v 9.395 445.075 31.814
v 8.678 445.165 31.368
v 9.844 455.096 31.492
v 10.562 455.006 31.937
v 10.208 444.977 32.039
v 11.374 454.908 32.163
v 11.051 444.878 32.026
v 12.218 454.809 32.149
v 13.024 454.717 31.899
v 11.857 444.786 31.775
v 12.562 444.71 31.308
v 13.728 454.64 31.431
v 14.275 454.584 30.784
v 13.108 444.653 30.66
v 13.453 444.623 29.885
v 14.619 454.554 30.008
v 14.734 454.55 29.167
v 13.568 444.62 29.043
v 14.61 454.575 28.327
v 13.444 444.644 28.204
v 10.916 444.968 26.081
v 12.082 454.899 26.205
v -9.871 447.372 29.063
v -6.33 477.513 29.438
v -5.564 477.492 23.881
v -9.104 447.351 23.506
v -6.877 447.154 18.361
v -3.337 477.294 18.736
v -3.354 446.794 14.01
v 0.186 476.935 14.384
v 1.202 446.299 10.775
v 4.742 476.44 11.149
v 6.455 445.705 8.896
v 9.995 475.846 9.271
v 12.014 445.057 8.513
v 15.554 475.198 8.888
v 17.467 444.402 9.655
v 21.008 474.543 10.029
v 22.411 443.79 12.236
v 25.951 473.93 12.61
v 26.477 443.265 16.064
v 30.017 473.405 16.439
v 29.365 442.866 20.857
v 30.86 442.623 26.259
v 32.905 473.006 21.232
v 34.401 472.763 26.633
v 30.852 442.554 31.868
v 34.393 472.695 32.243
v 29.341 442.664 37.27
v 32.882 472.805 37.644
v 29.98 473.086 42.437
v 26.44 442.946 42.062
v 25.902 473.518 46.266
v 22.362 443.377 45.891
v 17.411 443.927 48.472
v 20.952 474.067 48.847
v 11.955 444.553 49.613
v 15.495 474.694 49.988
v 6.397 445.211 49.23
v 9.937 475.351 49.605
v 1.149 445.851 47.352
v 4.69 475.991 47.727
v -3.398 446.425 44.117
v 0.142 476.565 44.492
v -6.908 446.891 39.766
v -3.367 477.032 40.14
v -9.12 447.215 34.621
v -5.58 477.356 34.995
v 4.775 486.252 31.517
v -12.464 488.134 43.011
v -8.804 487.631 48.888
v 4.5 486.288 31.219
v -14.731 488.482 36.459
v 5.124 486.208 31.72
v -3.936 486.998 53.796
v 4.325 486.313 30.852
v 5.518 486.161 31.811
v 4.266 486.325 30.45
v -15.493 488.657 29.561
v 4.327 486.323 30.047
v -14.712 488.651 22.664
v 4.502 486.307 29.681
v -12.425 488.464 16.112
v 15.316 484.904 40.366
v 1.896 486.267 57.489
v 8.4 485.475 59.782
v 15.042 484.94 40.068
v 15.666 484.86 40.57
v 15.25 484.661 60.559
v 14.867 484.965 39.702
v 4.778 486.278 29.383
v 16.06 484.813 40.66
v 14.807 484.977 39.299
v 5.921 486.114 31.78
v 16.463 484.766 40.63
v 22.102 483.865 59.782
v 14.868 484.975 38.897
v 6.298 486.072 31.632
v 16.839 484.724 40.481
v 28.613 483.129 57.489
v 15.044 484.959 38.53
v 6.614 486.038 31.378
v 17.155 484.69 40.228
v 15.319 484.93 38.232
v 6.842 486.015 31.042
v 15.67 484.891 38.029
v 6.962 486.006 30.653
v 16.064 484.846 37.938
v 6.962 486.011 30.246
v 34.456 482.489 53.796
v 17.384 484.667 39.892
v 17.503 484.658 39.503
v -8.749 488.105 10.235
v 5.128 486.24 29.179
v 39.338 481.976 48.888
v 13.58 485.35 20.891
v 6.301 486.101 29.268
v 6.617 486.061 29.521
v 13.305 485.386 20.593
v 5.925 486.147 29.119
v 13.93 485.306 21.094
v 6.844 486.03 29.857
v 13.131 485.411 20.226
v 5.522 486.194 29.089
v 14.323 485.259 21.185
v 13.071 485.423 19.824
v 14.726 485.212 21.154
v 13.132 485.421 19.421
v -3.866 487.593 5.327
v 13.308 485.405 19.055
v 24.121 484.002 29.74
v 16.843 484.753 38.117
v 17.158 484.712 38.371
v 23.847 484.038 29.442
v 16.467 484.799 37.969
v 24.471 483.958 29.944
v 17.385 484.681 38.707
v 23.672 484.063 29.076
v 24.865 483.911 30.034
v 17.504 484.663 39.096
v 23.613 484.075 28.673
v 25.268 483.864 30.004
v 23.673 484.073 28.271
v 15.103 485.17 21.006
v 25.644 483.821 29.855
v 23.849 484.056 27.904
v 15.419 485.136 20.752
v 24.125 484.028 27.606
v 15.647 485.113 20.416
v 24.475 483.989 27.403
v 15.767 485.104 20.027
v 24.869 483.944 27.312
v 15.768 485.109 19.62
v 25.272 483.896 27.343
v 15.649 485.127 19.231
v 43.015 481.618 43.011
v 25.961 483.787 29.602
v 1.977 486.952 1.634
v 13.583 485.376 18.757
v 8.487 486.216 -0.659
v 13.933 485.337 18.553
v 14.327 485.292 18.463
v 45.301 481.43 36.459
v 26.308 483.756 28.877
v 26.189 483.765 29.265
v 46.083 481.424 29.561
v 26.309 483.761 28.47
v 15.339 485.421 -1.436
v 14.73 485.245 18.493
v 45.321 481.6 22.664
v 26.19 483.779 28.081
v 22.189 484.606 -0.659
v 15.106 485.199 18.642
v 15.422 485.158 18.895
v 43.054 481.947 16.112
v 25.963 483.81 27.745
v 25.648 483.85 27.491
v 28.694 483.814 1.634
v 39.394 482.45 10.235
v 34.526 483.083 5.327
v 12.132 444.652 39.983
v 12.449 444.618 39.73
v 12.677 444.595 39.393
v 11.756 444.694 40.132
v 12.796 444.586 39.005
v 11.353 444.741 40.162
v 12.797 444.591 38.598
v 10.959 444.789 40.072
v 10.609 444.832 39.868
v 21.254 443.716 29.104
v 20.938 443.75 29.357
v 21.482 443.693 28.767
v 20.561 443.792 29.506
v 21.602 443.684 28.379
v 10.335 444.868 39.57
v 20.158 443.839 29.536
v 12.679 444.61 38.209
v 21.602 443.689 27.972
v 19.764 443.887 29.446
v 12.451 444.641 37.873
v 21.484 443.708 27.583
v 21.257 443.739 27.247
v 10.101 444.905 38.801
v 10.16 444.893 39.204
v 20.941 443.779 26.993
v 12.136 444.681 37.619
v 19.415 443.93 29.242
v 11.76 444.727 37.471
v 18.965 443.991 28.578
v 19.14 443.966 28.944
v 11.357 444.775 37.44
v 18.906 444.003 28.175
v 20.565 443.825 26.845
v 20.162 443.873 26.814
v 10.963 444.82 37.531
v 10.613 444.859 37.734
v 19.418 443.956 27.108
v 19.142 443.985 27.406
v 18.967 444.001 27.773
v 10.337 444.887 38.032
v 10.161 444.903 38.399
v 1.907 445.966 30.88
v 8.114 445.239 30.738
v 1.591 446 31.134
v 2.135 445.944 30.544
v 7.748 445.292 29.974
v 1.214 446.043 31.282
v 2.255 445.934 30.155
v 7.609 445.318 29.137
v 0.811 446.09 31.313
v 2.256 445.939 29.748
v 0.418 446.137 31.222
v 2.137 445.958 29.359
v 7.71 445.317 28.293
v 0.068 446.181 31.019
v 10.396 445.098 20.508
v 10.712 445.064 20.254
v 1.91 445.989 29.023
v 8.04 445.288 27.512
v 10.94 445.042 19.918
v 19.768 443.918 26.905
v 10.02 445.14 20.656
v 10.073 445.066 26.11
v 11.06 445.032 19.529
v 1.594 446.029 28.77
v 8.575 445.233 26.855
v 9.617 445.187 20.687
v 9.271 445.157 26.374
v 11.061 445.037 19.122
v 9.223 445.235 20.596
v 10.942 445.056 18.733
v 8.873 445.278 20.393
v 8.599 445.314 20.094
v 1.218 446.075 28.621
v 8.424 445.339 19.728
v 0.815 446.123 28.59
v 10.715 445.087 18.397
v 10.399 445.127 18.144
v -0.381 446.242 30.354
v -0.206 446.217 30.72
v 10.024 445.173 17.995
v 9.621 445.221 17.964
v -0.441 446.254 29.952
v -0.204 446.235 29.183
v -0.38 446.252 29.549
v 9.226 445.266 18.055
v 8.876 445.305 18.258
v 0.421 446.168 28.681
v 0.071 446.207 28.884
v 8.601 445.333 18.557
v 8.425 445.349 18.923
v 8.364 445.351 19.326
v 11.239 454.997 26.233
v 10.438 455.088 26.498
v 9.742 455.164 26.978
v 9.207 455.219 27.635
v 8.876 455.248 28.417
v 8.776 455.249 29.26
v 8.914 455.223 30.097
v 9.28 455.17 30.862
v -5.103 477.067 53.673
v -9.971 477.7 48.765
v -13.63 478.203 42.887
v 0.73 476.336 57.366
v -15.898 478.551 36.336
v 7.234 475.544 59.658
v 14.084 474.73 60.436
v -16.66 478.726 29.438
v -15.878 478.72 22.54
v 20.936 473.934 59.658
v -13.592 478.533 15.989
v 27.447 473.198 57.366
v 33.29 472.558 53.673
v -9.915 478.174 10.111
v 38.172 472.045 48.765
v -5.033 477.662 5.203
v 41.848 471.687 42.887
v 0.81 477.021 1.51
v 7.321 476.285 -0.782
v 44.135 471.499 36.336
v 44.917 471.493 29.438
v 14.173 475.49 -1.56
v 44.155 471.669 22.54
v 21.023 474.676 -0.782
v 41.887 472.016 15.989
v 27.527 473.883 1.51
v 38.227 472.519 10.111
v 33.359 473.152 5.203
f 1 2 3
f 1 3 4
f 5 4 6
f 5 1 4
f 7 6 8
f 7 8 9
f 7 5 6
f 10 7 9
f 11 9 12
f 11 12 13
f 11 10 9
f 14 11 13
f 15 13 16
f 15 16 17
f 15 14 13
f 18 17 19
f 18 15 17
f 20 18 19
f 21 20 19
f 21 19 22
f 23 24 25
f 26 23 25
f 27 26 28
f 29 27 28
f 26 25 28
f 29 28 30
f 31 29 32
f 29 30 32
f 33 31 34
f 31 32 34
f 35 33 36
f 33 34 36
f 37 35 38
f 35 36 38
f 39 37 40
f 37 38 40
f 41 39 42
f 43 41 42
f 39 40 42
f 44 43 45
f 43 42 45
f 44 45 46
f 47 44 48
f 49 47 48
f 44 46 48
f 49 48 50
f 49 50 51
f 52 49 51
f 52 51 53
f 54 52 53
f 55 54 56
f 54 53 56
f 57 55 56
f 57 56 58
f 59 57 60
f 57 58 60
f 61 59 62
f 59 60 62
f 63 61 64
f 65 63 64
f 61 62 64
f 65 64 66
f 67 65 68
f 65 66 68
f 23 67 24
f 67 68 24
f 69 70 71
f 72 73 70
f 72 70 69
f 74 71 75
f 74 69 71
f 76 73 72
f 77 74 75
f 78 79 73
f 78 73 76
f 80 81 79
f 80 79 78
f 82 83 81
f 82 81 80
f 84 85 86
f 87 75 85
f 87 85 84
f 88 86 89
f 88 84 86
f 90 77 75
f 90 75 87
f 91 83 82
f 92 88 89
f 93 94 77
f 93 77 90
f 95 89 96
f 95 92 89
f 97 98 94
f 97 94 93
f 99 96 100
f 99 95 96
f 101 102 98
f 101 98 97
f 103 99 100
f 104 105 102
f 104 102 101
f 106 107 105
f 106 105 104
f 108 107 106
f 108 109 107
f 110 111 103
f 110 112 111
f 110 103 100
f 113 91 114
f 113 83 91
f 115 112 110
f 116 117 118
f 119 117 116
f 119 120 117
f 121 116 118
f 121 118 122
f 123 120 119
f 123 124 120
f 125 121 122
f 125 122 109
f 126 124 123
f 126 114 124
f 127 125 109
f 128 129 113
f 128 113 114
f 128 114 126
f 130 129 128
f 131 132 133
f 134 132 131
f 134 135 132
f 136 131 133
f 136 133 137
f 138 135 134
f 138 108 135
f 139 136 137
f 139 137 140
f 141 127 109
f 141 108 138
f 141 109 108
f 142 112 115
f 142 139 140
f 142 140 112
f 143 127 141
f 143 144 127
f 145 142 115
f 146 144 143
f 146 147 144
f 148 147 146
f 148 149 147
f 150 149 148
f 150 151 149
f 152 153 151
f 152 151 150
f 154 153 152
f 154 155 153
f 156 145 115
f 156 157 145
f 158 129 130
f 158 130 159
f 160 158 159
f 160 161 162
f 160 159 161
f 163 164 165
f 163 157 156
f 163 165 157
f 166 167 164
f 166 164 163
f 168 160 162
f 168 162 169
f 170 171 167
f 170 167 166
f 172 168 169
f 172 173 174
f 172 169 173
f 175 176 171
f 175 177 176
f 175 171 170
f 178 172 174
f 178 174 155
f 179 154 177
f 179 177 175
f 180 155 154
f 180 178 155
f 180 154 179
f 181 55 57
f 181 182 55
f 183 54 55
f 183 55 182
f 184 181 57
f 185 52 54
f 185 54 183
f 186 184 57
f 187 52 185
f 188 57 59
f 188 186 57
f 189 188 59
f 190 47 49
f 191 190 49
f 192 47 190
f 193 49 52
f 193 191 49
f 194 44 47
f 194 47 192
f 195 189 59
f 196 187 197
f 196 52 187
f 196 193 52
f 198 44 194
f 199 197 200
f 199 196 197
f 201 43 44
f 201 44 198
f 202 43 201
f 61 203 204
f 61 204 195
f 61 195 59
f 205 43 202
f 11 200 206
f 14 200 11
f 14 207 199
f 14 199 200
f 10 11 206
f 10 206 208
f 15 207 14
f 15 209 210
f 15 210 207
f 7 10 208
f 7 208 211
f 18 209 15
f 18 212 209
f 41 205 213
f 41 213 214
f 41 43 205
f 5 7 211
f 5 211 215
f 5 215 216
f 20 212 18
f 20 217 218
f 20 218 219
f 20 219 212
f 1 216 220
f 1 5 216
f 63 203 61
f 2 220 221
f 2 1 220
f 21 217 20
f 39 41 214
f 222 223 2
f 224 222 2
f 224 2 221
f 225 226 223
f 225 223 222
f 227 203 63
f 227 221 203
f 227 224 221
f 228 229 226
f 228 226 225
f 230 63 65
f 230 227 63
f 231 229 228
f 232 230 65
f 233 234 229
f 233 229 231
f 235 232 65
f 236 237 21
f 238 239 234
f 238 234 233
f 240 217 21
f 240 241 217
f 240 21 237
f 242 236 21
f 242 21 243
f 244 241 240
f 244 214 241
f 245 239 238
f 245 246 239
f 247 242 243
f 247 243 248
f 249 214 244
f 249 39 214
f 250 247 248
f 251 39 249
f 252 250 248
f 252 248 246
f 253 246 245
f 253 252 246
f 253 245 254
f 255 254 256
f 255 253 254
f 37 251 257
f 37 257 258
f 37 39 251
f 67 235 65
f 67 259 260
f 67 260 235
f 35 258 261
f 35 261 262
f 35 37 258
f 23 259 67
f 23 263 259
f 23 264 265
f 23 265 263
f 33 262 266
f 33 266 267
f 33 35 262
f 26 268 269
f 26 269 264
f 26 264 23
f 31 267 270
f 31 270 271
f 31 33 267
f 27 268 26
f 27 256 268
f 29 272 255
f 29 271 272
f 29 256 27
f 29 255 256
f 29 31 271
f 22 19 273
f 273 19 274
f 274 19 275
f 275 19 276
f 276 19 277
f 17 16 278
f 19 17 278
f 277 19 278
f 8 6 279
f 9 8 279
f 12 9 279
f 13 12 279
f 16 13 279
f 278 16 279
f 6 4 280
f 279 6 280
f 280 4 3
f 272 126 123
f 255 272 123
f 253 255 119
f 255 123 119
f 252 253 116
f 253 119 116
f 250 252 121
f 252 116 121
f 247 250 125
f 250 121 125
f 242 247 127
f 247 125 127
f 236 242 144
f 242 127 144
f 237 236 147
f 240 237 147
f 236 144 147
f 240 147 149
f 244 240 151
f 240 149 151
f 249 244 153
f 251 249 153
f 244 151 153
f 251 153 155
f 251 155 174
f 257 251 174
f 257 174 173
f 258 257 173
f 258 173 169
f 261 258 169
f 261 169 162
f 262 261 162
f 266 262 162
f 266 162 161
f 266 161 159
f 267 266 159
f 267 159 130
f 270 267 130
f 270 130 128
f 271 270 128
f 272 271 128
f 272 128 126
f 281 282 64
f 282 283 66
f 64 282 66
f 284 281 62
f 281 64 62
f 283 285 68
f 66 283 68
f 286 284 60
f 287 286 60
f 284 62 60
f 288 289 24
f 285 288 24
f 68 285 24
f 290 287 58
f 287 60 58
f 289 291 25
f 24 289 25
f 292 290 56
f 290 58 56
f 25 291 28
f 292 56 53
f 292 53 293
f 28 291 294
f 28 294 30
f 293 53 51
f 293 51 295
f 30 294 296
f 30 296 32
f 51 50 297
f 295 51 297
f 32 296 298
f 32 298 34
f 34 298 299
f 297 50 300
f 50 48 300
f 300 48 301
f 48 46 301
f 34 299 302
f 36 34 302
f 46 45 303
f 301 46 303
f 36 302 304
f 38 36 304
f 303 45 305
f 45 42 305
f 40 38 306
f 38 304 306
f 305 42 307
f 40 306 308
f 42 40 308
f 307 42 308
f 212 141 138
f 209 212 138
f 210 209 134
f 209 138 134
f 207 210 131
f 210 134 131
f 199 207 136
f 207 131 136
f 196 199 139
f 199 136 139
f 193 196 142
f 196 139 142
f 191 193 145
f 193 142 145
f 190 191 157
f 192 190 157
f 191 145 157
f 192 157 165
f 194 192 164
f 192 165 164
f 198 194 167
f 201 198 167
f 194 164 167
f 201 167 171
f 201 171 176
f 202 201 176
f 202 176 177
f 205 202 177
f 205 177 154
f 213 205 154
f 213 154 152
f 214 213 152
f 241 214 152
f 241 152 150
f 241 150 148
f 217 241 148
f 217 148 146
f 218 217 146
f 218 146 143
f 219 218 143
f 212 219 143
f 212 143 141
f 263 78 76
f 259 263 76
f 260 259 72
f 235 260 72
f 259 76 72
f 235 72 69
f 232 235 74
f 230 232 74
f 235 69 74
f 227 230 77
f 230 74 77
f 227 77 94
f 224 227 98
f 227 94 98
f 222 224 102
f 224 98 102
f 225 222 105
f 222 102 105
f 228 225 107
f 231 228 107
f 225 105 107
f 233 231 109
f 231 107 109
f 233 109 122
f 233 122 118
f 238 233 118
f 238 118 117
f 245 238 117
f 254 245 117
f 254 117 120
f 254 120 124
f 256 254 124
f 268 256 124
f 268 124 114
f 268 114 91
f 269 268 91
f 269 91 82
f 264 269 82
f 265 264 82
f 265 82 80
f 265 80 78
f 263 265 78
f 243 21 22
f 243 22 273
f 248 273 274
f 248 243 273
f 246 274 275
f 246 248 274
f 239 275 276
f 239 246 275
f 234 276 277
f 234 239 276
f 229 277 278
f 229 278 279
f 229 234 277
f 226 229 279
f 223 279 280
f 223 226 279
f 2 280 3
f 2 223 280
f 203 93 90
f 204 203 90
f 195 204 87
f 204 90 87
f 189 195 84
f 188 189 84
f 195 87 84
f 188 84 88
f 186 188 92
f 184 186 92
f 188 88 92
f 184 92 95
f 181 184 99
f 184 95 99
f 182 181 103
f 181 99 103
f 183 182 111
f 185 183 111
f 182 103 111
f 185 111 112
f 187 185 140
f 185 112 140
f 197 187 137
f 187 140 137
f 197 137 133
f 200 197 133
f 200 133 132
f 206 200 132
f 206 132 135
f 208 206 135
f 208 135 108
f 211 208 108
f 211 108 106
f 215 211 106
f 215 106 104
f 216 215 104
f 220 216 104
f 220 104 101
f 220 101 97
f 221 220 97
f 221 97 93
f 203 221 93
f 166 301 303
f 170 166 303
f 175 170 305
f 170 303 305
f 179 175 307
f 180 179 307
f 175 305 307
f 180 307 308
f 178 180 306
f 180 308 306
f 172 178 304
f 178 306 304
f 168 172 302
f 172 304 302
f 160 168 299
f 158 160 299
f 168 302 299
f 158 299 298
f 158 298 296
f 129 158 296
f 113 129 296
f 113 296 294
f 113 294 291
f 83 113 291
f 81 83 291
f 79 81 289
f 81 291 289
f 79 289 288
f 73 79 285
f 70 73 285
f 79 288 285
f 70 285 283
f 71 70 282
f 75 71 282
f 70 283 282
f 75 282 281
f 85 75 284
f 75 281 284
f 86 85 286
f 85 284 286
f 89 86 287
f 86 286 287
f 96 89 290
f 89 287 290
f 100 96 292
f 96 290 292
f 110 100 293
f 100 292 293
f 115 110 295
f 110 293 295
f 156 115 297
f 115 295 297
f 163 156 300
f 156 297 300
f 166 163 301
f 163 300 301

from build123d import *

# Parameters (mm, degrees)
BOSS_EXTRUDE2_DEPTH      = 12
BOSS_EXTRUDE2_DEPTH_BACK = 18.35
SKETCH3_R                = 20.599499999
CUT_EXTRUDE2_DEPTH       = 10
SKETCH5_R                = 30.999999999
BOSS_EXTRUDE3_DEPTH      = 10
CUT_EXTRUDE3_REACH       = 100.809
SKETCH7_R                = 1.365


with BuildPart() as part:
    # Sketch3 → Boss-Extrude2 (new, two sides: drawn at the far end of the back side and taken through both)
    with BuildSketch(Plane(origin=(53.132442303, 452.346775715, 5.622561963), x_dir=(0.9931732430561937, -0.11663964741431751, -0.0014498028509745849), z_dir=(-0.11664865741723304, -0.9930965298387961, -0.012343951753720052)).offset(-BOSS_EXTRUDE2_DEPTH_BACK)):
        with Locations(Location((-41.42738807, 23.530711727, 0), (0, 0, 180.083073943))):
            Circle(SKETCH3_R)
    extrude(amount=BOSS_EXTRUDE2_DEPTH + BOSS_EXTRUDE2_DEPTH_BACK)

    # Sketch4 → Cut-Extrude2 (cut)
    with BuildSketch(Plane(origin=(51.732658414, 440.429617357, 5.474434542), x_dir=(0.9931732430561937, -0.1166396474143174, -0.001449802850974575), z_dir=(-0.11664865741723293, -0.9930965298387961, -0.012343951753719985))):
        with BuildLine():
            Line((-38.551989149, 22.67509438), (-41.097444518, 20.548910719))
            ThreePointArc((-41.097444518, 20.548910719), (-44.186998686, 22.354043021), (-43.350593551, 25.833162742))
            ThreePointArc((-43.350593551, 25.833162742), (-39.778140656, 26.036701146), (-38.551989149, 22.67509438))
        make_face()
    extrude(amount=-CUT_EXTRUDE2_DEPTH, mode=Mode.SUBTRACT)

    # Sketch5 → Boss-Extrude3 (add)
    with BuildSketch(Plane(origin=(55.272945167, 470.570097038, 5.849073478), x_dir=(0.9931732430561937, -0.11663964741431687, -0.0014498028509745493), z_dir=(0.11664865741723239, 0.9930965298387961, 0.012343951753719856))):
        with Locations(Location((-41.42738807, -23.530711727, 0), (0, 0, 359.916926057))):
            Circle(SKETCH5_R)
    extrude(amount=BOSS_EXTRUDE3_DEPTH)

    # Sketch7 → Cut-Extrude3 (cut, up to next)
    with BuildSketch(Plane(origin=(56.439431742, 480.501062336, 5.972512996), x_dir=(0.9931732430561937, -0.11663964741431691, -0.0014498028509745543), z_dir=(0.11664865741723243, 0.9930965298387961, 0.012343951753719861)), mode=Mode.PRIVATE) as cut_extrude3_sk1:
        with Locations(Location((-40.55325276, -33.270564316, 0), (0, 0, 179.916926057))):
            Circle(SKETCH7_R)
    cut_extrude3_tool1 = extrude(cut_extrude3_sk1.sketch, amount=-CUT_EXTRUDE3_REACH, mode=Mode.PRIVATE) & part.part
    # Sketch7 → Cut-Extrude3 (cut, up to next)
    with BuildSketch(Plane(origin=(56.439431742, 480.501062336, 5.972512996), x_dir=(0.9931732430561937, -0.11663964741431691, -0.0014498028509745543), z_dir=(0.11664865741723243, 0.9930965298387961, 0.012343951753719861)), mode=Mode.PRIVATE) as cut_extrude3_sk2:
        with Locations(Location((-51.16724066, -24.404847037, 0), (0, 0, 179.916926057))):
            Circle(SKETCH7_R)
    cut_extrude3_tool2 = extrude(cut_extrude3_sk2.sketch, amount=-CUT_EXTRUDE3_REACH, mode=Mode.PRIVATE) & part.part
    # Sketch7 → Cut-Extrude3 (cut, up to next)
    with BuildSketch(Plane(origin=(56.439431742, 480.501062336, 5.972512996), x_dir=(0.9931732430561937, -0.11663964741431691, -0.0014498028509745543), z_dir=(0.11664865741723243, 0.9930965298387961, 0.012343951753719861)), mode=Mode.PRIVATE) as cut_extrude3_sk3:
        with Locations(Location((-42.301523381, -13.790859137, 0), (0, 0, 179.916926057))):
            Circle(SKETCH7_R)
    cut_extrude3_tool3 = extrude(cut_extrude3_sk3.sketch, amount=-CUT_EXTRUDE3_REACH, mode=Mode.PRIVATE) & part.part
    # Sketch7 → Cut-Extrude3 (cut, up to next)
    with BuildSketch(Plane(origin=(56.439431742, 480.501062336, 5.972512996), x_dir=(0.9931732430561937, -0.11663964741431691, -0.0014498028509745543), z_dir=(0.11664865741723243, 0.9930965298387961, 0.012343951753719861)), mode=Mode.PRIVATE) as cut_extrude3_sk4:
        with Locations(Location((-31.687535481, -22.656576416, 0), (0, 0, 179.916926057))):
            Circle(SKETCH7_R)
    cut_extrude3_tool4 = extrude(cut_extrude3_sk4.sketch, amount=-CUT_EXTRUDE3_REACH, mode=Mode.PRIVATE) & part.part
    add(cut_extrude3_tool1.solids().sort_by_distance((16.163026, 484.817666, 39.299302))[0], mode=Mode.SUBTRACT)
    add(cut_extrude3_tool2.solids().sort_by_distance((5.621497, 486.165868, 30.449657))[0], mode=Mode.SUBTRACT)
    add(cut_extrude3_tool3.solids().sort_by_distance((14.426691, 485.263693, 19.823636))[0], mode=Mode.SUBTRACT)
    add(cut_extrude3_tool4.solids().sort_by_distance((24.968219, 483.915491, 28.67328))[0], mode=Mode.SUBTRACT)


solid = part.part
